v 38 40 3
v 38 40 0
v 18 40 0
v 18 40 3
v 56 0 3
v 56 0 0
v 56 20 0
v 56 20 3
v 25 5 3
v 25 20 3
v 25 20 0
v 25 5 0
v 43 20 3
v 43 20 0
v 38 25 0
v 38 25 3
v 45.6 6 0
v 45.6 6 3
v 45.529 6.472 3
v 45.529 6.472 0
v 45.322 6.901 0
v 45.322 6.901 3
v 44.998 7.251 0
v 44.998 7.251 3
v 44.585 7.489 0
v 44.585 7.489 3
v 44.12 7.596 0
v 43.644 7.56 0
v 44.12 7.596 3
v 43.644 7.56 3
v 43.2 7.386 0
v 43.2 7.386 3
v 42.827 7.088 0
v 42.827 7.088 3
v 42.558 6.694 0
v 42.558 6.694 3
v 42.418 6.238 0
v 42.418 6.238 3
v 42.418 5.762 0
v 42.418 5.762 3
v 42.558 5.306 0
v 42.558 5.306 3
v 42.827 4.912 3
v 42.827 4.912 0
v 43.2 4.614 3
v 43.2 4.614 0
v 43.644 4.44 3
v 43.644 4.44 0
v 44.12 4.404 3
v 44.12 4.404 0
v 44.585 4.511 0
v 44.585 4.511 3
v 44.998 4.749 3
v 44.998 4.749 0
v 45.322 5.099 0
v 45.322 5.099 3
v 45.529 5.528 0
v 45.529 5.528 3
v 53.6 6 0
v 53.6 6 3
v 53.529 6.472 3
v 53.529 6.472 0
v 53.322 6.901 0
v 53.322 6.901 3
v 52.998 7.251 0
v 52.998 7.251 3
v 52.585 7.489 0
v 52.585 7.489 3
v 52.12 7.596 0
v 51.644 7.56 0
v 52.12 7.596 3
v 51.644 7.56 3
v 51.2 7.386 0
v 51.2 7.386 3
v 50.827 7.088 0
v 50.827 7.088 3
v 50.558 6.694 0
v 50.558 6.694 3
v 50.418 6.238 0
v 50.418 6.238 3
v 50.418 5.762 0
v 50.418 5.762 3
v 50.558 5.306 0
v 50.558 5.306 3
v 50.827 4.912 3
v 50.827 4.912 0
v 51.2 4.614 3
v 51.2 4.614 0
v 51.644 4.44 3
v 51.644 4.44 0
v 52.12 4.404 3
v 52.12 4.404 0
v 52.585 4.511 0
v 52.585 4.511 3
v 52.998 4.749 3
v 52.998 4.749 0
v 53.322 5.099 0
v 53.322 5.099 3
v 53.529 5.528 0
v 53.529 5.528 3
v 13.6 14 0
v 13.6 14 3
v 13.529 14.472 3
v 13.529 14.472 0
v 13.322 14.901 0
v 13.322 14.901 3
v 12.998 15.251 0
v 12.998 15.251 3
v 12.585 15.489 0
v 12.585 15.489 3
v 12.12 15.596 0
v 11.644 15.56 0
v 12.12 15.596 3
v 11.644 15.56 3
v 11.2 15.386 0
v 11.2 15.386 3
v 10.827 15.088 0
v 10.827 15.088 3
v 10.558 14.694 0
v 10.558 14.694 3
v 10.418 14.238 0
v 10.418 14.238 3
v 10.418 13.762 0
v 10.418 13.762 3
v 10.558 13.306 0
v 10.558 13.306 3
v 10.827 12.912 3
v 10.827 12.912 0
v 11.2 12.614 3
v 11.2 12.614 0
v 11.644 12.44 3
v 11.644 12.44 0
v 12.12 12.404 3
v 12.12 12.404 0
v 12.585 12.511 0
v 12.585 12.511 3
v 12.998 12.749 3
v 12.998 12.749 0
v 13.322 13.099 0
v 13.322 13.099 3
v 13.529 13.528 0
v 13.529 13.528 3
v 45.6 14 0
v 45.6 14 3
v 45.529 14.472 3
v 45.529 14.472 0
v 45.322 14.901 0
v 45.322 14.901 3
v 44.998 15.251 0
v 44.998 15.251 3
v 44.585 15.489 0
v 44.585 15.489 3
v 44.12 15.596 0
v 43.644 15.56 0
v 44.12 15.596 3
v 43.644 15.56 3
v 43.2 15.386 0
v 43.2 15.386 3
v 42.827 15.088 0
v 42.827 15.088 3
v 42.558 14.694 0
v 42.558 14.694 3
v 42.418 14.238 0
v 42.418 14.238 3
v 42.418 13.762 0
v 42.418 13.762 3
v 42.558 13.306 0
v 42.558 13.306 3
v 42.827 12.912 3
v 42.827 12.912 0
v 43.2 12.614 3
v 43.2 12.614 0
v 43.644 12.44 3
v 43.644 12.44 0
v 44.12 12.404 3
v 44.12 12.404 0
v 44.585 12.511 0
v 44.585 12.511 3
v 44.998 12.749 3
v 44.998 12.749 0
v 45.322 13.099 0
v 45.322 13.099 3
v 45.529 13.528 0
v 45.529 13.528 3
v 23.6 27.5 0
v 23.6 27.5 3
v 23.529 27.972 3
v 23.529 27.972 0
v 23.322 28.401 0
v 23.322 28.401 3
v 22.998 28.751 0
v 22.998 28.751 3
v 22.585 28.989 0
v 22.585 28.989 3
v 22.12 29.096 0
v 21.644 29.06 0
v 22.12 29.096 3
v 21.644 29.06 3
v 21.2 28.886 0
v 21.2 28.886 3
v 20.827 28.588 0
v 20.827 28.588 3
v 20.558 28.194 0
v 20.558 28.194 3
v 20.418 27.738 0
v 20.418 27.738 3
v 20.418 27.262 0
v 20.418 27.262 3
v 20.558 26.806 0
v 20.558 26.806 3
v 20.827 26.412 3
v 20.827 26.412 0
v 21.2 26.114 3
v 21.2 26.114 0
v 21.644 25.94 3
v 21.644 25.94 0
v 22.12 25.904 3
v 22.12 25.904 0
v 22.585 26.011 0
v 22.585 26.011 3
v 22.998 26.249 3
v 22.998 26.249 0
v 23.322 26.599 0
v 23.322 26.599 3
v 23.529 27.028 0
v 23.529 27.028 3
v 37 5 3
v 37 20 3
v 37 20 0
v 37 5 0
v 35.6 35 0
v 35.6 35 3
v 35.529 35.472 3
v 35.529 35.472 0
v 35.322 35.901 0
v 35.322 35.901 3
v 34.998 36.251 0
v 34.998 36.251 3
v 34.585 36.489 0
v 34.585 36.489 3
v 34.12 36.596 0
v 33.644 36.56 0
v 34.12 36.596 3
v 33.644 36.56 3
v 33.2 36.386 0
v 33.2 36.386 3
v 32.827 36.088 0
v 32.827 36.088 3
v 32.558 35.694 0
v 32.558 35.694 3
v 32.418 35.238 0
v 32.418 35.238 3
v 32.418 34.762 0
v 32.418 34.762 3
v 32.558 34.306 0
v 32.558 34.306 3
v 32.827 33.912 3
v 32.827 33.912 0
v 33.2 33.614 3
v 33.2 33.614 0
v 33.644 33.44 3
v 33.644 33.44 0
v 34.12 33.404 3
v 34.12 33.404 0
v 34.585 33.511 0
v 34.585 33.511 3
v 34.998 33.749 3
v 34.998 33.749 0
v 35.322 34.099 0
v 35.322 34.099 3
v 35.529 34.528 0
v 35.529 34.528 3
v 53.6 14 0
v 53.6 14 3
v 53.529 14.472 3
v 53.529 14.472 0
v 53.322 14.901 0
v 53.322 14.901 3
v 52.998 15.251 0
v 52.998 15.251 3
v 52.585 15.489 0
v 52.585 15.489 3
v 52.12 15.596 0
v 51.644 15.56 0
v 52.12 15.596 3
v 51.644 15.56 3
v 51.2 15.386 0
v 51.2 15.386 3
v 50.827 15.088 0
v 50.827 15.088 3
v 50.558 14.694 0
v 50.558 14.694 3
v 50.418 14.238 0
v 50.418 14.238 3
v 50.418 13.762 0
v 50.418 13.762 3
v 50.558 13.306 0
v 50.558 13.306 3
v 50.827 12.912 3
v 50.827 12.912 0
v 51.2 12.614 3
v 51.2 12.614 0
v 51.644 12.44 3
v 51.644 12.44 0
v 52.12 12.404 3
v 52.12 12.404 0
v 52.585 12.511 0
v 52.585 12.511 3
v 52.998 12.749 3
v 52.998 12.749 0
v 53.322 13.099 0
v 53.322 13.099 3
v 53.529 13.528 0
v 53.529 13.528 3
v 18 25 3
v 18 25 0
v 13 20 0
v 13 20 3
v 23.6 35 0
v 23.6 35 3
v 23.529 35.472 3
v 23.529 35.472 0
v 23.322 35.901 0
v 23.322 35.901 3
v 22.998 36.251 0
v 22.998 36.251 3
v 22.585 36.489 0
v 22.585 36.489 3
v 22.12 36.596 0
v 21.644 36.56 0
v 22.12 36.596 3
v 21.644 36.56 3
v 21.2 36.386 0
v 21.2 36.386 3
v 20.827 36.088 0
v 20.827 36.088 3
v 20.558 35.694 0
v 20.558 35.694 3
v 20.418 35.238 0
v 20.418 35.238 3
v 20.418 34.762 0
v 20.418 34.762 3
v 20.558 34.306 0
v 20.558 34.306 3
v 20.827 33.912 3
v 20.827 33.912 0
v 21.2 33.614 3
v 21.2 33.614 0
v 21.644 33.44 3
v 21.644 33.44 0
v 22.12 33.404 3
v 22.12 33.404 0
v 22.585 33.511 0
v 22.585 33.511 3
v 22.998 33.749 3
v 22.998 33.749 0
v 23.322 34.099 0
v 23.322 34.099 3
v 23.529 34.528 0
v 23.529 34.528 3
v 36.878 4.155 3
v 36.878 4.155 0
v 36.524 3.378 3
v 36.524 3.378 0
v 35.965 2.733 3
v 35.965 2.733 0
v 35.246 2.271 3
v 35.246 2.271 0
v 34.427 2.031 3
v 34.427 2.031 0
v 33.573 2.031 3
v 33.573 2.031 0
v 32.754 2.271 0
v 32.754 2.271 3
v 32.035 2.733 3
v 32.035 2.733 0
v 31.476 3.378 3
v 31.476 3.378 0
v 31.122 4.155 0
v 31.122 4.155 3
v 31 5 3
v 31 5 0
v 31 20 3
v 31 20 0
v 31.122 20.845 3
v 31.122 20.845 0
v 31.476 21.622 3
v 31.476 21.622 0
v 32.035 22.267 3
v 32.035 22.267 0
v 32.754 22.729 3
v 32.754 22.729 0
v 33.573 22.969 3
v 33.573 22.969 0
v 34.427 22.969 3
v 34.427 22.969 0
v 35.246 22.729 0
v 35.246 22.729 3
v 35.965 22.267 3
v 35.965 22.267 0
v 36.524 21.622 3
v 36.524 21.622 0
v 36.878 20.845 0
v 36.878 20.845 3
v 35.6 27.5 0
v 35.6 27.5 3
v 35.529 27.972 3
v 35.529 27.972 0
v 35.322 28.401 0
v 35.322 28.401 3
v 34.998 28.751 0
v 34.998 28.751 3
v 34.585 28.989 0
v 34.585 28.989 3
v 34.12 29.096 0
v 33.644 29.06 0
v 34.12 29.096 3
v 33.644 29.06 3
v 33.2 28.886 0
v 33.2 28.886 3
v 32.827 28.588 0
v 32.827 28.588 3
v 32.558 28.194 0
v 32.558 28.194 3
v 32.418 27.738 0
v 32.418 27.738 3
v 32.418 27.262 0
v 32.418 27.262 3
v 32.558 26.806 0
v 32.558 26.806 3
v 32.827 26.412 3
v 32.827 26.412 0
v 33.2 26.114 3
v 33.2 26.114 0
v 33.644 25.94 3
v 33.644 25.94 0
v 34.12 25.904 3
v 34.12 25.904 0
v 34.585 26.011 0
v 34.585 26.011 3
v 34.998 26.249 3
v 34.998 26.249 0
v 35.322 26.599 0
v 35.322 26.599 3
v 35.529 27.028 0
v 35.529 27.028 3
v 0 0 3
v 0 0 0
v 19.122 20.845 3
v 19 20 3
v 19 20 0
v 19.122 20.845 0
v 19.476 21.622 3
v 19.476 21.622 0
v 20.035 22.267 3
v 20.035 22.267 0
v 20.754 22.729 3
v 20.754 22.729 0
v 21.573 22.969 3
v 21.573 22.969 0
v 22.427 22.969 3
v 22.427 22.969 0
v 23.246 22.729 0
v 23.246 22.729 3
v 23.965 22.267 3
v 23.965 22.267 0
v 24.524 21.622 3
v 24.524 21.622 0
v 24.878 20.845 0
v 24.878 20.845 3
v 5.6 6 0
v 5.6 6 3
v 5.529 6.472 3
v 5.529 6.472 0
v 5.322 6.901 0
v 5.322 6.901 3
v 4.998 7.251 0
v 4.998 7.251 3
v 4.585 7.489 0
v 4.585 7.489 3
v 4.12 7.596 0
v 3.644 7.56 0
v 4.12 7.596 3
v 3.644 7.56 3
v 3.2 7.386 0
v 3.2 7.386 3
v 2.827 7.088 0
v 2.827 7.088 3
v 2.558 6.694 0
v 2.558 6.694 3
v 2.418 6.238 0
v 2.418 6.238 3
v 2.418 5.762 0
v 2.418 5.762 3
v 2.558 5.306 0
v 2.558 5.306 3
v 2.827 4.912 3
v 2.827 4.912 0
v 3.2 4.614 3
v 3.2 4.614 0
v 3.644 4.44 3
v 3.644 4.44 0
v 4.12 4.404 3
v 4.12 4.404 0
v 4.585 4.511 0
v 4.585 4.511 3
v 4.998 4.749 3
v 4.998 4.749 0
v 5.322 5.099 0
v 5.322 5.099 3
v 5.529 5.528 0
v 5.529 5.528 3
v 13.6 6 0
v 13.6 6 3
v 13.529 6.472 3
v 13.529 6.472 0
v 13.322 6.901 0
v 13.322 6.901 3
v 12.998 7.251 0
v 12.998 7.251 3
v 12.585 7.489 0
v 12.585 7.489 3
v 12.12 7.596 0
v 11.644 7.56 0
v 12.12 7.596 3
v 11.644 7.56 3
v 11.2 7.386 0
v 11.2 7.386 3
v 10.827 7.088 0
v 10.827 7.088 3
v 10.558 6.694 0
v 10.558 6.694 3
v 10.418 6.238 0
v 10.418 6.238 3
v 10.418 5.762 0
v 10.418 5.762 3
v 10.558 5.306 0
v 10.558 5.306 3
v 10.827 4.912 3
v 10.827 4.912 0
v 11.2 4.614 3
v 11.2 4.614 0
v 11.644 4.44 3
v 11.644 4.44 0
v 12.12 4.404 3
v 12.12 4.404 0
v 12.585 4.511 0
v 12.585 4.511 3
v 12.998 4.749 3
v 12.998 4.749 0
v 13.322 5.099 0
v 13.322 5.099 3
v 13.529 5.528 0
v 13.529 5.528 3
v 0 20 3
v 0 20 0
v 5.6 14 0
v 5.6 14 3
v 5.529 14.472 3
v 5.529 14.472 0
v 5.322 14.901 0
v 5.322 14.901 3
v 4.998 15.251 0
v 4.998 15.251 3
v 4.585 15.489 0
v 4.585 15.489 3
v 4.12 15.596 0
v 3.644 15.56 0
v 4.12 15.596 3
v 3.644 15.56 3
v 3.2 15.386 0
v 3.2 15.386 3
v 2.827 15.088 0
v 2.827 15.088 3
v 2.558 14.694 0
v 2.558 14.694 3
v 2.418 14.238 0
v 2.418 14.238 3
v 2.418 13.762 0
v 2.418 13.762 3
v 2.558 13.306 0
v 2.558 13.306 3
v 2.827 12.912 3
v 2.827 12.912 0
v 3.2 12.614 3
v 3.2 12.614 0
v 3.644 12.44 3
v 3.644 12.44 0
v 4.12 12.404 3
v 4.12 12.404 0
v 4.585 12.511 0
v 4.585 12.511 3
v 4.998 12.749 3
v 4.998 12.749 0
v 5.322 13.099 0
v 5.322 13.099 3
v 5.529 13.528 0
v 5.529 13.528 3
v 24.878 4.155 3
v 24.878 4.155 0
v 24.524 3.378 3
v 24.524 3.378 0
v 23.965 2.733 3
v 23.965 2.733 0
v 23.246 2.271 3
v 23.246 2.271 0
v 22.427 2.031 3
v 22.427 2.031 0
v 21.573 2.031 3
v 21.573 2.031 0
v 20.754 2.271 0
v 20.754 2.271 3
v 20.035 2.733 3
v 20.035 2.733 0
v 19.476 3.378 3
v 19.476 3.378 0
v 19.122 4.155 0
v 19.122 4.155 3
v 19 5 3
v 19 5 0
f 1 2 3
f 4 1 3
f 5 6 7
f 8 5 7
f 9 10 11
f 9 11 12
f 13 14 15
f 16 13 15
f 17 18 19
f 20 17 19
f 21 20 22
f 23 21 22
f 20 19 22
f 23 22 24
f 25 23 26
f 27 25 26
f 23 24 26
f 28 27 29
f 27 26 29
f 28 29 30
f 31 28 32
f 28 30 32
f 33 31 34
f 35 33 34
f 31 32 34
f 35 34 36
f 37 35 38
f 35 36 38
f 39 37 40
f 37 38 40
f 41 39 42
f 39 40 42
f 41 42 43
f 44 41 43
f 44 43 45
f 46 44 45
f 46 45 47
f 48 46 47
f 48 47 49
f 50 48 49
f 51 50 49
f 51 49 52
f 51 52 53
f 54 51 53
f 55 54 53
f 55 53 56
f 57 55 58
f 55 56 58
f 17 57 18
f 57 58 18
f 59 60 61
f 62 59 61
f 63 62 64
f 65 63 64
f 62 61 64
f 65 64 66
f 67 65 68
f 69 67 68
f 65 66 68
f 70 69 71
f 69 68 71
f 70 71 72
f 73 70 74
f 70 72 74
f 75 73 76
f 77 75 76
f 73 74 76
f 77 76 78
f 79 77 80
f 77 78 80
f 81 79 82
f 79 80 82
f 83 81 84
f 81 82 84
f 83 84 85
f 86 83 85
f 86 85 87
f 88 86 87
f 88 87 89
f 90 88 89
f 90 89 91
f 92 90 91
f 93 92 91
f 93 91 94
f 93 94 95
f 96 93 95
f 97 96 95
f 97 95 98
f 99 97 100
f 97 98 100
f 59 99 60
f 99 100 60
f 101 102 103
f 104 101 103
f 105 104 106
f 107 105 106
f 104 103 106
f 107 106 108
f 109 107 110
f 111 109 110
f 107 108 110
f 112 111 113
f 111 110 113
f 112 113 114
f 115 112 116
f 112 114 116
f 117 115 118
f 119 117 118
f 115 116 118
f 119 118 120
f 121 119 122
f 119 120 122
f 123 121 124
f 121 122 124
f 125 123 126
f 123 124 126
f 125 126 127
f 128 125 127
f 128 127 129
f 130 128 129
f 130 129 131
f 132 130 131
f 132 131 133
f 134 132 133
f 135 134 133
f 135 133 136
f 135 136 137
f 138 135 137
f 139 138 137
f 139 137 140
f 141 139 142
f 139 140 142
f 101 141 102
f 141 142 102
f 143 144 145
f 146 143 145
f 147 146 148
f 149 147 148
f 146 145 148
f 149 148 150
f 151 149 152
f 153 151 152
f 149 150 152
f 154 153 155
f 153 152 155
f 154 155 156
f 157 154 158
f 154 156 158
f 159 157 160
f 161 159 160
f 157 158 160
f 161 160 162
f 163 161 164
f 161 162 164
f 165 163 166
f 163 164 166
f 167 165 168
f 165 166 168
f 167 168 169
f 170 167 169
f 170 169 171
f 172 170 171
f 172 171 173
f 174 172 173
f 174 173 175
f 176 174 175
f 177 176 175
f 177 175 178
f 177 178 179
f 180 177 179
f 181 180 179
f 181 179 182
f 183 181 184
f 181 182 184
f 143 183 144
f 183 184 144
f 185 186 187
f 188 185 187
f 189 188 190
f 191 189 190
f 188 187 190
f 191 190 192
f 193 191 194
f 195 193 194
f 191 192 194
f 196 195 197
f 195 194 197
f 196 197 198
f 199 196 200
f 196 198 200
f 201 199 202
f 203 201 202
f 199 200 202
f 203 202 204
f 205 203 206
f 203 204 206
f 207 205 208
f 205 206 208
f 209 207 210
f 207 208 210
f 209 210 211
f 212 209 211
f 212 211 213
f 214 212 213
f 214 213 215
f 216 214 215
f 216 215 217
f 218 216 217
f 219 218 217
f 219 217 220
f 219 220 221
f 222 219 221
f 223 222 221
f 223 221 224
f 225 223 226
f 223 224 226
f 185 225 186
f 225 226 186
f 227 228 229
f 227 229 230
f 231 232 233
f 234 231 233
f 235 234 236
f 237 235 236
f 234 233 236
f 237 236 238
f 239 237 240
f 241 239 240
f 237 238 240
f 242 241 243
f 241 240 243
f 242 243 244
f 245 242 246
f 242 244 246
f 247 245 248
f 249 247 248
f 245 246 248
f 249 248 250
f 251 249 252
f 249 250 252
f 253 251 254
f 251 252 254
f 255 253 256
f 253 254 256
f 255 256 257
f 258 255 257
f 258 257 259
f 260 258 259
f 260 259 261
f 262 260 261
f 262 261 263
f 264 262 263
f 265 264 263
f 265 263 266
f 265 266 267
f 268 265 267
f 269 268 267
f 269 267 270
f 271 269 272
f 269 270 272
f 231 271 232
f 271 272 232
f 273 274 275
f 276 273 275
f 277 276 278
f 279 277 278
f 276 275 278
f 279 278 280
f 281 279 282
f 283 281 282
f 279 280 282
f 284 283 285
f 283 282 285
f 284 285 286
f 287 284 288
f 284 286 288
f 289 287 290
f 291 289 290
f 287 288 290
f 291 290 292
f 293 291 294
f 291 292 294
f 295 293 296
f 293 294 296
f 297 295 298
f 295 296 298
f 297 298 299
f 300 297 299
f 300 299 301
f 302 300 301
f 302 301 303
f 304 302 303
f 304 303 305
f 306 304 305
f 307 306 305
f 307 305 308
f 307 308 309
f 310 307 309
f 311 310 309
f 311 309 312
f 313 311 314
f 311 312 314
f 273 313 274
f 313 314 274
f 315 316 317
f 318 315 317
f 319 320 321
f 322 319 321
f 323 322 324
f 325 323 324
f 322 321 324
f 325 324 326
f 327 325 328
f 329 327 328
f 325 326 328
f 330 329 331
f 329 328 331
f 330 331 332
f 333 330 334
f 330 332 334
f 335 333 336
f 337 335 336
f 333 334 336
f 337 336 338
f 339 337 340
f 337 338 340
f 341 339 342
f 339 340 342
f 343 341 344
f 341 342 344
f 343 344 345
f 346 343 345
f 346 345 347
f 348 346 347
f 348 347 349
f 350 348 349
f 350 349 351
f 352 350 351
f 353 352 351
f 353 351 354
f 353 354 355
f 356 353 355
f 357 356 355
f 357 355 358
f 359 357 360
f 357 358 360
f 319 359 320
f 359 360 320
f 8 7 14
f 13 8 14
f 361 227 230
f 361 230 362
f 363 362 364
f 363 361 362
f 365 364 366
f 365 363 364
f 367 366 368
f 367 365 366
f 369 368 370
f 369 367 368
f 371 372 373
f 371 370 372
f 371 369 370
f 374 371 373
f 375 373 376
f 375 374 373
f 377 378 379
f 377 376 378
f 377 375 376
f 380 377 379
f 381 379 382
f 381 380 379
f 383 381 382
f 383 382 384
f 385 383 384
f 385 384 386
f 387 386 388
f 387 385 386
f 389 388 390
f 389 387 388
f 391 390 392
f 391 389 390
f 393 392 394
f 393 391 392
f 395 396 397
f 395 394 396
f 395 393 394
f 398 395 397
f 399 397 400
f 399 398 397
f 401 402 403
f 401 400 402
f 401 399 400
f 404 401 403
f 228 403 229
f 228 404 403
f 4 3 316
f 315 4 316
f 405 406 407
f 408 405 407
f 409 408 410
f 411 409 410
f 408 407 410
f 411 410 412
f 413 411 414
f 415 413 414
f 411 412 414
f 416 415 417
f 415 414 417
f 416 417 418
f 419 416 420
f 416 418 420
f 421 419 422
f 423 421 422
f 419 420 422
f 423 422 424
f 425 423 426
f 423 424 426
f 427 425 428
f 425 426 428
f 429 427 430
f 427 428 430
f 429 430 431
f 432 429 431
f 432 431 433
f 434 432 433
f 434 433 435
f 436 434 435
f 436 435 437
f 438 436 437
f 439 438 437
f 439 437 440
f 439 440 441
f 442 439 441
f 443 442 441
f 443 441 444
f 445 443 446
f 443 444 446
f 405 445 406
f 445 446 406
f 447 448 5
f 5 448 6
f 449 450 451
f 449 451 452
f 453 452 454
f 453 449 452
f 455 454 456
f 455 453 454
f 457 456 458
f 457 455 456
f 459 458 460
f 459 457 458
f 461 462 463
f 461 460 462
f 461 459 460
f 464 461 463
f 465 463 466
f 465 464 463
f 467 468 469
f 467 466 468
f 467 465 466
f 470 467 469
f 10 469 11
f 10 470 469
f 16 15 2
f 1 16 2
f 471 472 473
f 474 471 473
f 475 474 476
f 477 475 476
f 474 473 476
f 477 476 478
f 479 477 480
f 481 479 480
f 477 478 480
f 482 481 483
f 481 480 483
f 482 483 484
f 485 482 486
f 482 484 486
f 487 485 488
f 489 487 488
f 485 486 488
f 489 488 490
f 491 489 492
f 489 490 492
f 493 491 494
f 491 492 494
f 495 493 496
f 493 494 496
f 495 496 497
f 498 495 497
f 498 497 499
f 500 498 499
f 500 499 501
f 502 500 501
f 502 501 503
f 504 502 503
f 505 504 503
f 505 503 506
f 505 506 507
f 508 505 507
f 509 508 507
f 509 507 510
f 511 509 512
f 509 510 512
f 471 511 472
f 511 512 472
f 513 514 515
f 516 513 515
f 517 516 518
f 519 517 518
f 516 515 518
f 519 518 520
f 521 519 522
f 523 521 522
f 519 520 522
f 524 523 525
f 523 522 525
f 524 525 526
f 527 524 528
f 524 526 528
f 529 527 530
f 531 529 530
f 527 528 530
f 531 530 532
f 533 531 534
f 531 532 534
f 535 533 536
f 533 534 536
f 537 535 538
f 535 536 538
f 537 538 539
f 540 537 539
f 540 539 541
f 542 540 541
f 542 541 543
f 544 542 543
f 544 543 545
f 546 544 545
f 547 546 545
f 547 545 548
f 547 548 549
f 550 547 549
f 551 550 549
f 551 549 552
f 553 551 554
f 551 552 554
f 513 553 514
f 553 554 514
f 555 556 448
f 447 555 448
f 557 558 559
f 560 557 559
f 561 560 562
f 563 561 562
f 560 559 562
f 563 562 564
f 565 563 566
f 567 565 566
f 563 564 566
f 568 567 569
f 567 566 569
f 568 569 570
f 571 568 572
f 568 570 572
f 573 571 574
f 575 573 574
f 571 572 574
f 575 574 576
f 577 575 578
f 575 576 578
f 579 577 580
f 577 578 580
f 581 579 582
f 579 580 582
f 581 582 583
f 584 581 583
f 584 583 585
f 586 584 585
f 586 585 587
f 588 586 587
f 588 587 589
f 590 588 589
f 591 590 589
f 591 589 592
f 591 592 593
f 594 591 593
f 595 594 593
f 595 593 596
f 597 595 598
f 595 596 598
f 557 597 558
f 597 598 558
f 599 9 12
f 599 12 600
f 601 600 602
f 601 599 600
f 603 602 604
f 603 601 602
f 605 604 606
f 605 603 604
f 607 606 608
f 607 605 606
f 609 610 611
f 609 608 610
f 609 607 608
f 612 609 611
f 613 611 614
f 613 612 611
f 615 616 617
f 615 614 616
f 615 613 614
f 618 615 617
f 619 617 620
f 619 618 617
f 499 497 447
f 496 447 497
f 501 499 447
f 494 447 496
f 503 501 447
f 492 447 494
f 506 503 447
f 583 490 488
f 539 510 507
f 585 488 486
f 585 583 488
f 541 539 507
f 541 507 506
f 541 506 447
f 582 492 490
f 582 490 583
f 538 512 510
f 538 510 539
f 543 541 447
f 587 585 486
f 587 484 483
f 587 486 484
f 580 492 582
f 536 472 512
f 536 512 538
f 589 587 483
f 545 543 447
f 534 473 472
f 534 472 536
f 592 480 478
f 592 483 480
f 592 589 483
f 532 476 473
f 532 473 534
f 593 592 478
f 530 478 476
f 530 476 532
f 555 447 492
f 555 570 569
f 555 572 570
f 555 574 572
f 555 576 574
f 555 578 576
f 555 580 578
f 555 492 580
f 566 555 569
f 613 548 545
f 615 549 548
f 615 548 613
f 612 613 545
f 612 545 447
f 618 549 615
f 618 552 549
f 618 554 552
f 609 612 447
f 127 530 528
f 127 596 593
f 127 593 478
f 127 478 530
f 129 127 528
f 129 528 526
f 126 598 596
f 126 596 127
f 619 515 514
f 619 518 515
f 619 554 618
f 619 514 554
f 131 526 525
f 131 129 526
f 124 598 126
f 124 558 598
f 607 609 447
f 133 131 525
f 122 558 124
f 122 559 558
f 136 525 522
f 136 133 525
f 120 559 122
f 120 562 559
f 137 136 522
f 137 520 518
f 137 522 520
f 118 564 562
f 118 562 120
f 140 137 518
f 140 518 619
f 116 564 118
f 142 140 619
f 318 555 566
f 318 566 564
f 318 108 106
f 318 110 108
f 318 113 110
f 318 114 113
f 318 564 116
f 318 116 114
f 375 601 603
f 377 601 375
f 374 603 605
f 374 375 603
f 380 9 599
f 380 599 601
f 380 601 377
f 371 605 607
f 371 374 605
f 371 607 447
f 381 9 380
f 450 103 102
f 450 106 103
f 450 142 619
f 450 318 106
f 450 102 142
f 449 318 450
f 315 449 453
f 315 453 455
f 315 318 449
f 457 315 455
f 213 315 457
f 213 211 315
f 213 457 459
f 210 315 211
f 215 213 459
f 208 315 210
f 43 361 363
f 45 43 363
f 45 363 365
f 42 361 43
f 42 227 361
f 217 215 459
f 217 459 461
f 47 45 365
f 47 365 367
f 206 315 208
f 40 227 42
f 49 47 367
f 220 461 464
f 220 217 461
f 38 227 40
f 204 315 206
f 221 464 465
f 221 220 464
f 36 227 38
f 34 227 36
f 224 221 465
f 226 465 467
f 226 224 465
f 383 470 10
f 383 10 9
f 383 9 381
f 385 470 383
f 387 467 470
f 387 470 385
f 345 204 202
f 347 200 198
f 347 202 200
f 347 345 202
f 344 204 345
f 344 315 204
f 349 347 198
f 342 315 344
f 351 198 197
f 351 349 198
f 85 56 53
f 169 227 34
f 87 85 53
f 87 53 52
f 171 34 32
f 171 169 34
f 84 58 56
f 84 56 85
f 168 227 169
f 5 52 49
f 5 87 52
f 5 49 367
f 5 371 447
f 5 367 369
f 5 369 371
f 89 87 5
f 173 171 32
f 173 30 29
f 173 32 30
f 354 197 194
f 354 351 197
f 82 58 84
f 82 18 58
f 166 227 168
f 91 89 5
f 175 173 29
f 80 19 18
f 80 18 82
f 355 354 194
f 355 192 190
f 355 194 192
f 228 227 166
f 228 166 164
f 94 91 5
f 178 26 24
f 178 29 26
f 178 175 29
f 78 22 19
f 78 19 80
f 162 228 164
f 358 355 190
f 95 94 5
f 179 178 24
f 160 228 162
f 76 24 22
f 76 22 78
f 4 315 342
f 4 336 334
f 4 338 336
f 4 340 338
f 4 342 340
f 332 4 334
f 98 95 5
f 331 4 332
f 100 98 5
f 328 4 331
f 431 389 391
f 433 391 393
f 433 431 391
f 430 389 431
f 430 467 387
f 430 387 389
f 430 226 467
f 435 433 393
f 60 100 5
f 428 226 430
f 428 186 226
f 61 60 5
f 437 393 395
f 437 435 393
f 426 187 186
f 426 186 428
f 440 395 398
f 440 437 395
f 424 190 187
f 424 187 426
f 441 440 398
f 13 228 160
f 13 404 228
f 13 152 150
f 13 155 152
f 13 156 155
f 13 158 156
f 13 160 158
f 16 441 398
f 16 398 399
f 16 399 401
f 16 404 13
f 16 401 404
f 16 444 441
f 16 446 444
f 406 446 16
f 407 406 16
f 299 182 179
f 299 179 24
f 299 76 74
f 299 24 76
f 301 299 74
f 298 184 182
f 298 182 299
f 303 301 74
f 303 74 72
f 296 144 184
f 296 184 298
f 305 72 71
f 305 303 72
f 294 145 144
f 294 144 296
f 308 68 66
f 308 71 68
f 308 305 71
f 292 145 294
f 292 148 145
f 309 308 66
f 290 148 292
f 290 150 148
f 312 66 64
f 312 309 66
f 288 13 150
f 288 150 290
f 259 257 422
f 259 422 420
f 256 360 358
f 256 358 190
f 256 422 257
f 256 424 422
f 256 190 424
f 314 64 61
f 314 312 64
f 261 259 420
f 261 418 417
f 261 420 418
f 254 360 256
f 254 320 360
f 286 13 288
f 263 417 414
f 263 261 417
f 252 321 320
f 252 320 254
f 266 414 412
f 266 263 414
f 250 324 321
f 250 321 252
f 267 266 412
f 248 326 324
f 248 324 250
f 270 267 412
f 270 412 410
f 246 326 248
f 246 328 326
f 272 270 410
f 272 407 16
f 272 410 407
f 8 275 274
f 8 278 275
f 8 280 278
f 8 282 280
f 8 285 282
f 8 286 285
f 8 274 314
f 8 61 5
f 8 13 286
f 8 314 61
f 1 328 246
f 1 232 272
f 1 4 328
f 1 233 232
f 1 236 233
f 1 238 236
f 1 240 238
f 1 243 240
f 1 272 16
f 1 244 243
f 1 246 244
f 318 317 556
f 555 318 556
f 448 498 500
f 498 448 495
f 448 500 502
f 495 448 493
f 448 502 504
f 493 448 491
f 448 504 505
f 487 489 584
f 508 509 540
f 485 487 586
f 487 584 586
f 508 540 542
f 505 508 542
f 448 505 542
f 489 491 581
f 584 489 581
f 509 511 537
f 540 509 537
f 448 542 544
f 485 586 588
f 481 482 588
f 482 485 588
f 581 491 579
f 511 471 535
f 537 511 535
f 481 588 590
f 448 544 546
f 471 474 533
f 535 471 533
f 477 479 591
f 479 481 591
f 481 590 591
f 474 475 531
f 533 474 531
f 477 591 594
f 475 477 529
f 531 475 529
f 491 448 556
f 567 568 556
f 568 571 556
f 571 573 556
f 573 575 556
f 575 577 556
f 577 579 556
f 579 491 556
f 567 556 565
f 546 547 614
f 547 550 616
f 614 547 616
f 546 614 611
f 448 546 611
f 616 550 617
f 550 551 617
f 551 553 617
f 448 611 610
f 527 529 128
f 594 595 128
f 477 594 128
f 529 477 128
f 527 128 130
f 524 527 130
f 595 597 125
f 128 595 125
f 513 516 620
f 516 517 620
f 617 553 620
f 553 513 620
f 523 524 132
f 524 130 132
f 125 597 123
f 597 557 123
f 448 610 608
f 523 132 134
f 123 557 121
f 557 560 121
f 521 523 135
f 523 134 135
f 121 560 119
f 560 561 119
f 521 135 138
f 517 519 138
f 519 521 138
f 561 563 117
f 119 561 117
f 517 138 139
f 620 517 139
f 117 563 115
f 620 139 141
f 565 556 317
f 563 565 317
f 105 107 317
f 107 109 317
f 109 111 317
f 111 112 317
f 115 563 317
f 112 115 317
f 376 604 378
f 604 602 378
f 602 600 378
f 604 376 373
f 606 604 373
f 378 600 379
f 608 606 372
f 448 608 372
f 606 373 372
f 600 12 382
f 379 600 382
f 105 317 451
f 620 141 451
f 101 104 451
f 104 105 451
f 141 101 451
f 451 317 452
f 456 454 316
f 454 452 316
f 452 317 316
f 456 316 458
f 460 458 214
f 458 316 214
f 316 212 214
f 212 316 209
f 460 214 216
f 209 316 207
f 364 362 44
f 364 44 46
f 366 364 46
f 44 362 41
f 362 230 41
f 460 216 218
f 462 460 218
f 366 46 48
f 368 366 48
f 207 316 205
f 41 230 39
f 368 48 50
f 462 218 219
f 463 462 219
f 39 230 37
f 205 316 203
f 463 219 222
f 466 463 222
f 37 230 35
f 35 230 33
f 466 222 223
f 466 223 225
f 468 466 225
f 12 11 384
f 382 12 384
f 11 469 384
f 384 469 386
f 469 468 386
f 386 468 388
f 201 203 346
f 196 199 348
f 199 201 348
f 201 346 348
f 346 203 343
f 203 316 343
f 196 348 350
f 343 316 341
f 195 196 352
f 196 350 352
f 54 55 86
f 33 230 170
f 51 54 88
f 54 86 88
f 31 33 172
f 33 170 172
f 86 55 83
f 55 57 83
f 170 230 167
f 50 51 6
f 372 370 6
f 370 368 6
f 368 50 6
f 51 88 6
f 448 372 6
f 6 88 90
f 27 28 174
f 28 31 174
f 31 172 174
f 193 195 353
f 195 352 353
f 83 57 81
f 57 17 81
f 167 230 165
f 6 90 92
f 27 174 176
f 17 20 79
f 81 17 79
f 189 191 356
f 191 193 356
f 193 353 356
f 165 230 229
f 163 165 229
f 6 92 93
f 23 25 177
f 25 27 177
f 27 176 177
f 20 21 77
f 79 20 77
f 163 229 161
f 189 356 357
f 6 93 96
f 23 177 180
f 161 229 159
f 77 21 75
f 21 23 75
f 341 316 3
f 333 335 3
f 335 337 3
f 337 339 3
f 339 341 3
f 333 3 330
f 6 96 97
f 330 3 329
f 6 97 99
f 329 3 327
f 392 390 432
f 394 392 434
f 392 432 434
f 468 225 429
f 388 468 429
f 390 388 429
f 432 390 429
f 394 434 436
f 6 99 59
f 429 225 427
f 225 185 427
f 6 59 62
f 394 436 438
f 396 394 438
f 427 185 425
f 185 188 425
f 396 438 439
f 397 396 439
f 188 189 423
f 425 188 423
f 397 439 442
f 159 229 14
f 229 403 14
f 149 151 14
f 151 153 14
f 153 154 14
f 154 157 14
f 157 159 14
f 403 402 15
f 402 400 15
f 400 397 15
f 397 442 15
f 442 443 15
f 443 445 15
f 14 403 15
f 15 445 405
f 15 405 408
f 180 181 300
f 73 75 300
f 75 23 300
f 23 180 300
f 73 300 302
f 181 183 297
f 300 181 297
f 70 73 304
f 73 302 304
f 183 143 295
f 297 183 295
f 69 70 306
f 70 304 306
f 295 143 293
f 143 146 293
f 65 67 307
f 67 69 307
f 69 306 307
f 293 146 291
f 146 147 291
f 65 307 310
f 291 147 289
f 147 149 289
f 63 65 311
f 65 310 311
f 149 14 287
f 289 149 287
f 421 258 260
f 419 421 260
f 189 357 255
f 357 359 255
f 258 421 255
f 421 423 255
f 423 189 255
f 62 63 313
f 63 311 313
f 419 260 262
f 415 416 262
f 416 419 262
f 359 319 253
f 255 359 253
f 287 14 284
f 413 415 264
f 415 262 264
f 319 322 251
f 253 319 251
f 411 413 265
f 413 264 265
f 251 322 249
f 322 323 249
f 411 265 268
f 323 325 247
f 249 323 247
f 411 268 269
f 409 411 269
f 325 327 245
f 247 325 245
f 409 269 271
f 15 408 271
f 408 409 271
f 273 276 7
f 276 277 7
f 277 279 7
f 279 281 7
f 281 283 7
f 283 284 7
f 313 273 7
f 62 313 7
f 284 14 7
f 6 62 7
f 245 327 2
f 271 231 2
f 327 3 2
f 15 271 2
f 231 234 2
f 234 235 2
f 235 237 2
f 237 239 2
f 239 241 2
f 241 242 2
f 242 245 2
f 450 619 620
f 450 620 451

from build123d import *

# Parameters (mm, degrees)
EXTRUDE_1_DEPTH     = 3
SKETCH_2_R          = 1.6
CUT_EXTRUDE_1_DEPTH = 3
CUT_EXTRUDE_2_DEPTH = 10


with BuildPart() as part:
    # 草图1 → 凸台-拉伸1 (new body)
    with BuildSketch(Plane.XY):
        Polygon((0, 0), (56, 0), (56, 20), (43, 20), (38, 25), (38, 40), (18, 40), (18, 25), (13, 20), (0, 20), align=None)
    extrude(amount=EXTRUDE_1_DEPTH)

    # 草图2 → 切除-拉伸1 (cut)
    with BuildSketch(Plane.XY.offset(3)):
        with Locations((22, 35)):
            Circle(SKETCH_2_R)
        with Locations((34, 35)):
            Circle(SKETCH_2_R)
        with Locations((22, 27.5)):
            Circle(SKETCH_2_R)
        with Locations((34, 27.5)):
            Circle(SKETCH_2_R)
        with Locations((4, 14)):
            Circle(SKETCH_2_R)
        with Locations((4, 6)):
            Circle(SKETCH_2_R)
        with Locations((12, 14)):
            Circle(SKETCH_2_R)
        with Locations((12, 6)):
            Circle(SKETCH_2_R)
        with Locations((52, 14)):
            Circle(SKETCH_2_R)
        with Locations((52, 6)):
            Circle(SKETCH_2_R)
        with Locations((44, 6)):
            Circle(SKETCH_2_R)
        with Locations((44, 14)):
            Circle(SKETCH_2_R)
    extrude(amount=-CUT_EXTRUDE_1_DEPTH, mode=Mode.SUBTRACT)

    # 草图3 → 切除-拉伸2 (cut)
    with BuildSketch(Plane.XY.offset(3)):
        with BuildLine():
            Line((25, 20), (25, 5))
            ThreePointArc((25, 5), (22, 2), (19, 5))
            Line((19, 5), (19, 20))
            ThreePointArc((19, 20), (22, 23), (25, 20))
        make_face()
        with BuildLine():
            Line((37, 20), (37, 5))
            ThreePointArc((37, 5), (34, 2), (31, 5))
            Line((31, 5), (31, 20))
            ThreePointArc((31, 20), (34, 23), (37, 20))
        make_face()
    extrude(amount=-CUT_EXTRUDE_2_DEPTH, mode=Mode.SUBTRACT)


solid = part.part
